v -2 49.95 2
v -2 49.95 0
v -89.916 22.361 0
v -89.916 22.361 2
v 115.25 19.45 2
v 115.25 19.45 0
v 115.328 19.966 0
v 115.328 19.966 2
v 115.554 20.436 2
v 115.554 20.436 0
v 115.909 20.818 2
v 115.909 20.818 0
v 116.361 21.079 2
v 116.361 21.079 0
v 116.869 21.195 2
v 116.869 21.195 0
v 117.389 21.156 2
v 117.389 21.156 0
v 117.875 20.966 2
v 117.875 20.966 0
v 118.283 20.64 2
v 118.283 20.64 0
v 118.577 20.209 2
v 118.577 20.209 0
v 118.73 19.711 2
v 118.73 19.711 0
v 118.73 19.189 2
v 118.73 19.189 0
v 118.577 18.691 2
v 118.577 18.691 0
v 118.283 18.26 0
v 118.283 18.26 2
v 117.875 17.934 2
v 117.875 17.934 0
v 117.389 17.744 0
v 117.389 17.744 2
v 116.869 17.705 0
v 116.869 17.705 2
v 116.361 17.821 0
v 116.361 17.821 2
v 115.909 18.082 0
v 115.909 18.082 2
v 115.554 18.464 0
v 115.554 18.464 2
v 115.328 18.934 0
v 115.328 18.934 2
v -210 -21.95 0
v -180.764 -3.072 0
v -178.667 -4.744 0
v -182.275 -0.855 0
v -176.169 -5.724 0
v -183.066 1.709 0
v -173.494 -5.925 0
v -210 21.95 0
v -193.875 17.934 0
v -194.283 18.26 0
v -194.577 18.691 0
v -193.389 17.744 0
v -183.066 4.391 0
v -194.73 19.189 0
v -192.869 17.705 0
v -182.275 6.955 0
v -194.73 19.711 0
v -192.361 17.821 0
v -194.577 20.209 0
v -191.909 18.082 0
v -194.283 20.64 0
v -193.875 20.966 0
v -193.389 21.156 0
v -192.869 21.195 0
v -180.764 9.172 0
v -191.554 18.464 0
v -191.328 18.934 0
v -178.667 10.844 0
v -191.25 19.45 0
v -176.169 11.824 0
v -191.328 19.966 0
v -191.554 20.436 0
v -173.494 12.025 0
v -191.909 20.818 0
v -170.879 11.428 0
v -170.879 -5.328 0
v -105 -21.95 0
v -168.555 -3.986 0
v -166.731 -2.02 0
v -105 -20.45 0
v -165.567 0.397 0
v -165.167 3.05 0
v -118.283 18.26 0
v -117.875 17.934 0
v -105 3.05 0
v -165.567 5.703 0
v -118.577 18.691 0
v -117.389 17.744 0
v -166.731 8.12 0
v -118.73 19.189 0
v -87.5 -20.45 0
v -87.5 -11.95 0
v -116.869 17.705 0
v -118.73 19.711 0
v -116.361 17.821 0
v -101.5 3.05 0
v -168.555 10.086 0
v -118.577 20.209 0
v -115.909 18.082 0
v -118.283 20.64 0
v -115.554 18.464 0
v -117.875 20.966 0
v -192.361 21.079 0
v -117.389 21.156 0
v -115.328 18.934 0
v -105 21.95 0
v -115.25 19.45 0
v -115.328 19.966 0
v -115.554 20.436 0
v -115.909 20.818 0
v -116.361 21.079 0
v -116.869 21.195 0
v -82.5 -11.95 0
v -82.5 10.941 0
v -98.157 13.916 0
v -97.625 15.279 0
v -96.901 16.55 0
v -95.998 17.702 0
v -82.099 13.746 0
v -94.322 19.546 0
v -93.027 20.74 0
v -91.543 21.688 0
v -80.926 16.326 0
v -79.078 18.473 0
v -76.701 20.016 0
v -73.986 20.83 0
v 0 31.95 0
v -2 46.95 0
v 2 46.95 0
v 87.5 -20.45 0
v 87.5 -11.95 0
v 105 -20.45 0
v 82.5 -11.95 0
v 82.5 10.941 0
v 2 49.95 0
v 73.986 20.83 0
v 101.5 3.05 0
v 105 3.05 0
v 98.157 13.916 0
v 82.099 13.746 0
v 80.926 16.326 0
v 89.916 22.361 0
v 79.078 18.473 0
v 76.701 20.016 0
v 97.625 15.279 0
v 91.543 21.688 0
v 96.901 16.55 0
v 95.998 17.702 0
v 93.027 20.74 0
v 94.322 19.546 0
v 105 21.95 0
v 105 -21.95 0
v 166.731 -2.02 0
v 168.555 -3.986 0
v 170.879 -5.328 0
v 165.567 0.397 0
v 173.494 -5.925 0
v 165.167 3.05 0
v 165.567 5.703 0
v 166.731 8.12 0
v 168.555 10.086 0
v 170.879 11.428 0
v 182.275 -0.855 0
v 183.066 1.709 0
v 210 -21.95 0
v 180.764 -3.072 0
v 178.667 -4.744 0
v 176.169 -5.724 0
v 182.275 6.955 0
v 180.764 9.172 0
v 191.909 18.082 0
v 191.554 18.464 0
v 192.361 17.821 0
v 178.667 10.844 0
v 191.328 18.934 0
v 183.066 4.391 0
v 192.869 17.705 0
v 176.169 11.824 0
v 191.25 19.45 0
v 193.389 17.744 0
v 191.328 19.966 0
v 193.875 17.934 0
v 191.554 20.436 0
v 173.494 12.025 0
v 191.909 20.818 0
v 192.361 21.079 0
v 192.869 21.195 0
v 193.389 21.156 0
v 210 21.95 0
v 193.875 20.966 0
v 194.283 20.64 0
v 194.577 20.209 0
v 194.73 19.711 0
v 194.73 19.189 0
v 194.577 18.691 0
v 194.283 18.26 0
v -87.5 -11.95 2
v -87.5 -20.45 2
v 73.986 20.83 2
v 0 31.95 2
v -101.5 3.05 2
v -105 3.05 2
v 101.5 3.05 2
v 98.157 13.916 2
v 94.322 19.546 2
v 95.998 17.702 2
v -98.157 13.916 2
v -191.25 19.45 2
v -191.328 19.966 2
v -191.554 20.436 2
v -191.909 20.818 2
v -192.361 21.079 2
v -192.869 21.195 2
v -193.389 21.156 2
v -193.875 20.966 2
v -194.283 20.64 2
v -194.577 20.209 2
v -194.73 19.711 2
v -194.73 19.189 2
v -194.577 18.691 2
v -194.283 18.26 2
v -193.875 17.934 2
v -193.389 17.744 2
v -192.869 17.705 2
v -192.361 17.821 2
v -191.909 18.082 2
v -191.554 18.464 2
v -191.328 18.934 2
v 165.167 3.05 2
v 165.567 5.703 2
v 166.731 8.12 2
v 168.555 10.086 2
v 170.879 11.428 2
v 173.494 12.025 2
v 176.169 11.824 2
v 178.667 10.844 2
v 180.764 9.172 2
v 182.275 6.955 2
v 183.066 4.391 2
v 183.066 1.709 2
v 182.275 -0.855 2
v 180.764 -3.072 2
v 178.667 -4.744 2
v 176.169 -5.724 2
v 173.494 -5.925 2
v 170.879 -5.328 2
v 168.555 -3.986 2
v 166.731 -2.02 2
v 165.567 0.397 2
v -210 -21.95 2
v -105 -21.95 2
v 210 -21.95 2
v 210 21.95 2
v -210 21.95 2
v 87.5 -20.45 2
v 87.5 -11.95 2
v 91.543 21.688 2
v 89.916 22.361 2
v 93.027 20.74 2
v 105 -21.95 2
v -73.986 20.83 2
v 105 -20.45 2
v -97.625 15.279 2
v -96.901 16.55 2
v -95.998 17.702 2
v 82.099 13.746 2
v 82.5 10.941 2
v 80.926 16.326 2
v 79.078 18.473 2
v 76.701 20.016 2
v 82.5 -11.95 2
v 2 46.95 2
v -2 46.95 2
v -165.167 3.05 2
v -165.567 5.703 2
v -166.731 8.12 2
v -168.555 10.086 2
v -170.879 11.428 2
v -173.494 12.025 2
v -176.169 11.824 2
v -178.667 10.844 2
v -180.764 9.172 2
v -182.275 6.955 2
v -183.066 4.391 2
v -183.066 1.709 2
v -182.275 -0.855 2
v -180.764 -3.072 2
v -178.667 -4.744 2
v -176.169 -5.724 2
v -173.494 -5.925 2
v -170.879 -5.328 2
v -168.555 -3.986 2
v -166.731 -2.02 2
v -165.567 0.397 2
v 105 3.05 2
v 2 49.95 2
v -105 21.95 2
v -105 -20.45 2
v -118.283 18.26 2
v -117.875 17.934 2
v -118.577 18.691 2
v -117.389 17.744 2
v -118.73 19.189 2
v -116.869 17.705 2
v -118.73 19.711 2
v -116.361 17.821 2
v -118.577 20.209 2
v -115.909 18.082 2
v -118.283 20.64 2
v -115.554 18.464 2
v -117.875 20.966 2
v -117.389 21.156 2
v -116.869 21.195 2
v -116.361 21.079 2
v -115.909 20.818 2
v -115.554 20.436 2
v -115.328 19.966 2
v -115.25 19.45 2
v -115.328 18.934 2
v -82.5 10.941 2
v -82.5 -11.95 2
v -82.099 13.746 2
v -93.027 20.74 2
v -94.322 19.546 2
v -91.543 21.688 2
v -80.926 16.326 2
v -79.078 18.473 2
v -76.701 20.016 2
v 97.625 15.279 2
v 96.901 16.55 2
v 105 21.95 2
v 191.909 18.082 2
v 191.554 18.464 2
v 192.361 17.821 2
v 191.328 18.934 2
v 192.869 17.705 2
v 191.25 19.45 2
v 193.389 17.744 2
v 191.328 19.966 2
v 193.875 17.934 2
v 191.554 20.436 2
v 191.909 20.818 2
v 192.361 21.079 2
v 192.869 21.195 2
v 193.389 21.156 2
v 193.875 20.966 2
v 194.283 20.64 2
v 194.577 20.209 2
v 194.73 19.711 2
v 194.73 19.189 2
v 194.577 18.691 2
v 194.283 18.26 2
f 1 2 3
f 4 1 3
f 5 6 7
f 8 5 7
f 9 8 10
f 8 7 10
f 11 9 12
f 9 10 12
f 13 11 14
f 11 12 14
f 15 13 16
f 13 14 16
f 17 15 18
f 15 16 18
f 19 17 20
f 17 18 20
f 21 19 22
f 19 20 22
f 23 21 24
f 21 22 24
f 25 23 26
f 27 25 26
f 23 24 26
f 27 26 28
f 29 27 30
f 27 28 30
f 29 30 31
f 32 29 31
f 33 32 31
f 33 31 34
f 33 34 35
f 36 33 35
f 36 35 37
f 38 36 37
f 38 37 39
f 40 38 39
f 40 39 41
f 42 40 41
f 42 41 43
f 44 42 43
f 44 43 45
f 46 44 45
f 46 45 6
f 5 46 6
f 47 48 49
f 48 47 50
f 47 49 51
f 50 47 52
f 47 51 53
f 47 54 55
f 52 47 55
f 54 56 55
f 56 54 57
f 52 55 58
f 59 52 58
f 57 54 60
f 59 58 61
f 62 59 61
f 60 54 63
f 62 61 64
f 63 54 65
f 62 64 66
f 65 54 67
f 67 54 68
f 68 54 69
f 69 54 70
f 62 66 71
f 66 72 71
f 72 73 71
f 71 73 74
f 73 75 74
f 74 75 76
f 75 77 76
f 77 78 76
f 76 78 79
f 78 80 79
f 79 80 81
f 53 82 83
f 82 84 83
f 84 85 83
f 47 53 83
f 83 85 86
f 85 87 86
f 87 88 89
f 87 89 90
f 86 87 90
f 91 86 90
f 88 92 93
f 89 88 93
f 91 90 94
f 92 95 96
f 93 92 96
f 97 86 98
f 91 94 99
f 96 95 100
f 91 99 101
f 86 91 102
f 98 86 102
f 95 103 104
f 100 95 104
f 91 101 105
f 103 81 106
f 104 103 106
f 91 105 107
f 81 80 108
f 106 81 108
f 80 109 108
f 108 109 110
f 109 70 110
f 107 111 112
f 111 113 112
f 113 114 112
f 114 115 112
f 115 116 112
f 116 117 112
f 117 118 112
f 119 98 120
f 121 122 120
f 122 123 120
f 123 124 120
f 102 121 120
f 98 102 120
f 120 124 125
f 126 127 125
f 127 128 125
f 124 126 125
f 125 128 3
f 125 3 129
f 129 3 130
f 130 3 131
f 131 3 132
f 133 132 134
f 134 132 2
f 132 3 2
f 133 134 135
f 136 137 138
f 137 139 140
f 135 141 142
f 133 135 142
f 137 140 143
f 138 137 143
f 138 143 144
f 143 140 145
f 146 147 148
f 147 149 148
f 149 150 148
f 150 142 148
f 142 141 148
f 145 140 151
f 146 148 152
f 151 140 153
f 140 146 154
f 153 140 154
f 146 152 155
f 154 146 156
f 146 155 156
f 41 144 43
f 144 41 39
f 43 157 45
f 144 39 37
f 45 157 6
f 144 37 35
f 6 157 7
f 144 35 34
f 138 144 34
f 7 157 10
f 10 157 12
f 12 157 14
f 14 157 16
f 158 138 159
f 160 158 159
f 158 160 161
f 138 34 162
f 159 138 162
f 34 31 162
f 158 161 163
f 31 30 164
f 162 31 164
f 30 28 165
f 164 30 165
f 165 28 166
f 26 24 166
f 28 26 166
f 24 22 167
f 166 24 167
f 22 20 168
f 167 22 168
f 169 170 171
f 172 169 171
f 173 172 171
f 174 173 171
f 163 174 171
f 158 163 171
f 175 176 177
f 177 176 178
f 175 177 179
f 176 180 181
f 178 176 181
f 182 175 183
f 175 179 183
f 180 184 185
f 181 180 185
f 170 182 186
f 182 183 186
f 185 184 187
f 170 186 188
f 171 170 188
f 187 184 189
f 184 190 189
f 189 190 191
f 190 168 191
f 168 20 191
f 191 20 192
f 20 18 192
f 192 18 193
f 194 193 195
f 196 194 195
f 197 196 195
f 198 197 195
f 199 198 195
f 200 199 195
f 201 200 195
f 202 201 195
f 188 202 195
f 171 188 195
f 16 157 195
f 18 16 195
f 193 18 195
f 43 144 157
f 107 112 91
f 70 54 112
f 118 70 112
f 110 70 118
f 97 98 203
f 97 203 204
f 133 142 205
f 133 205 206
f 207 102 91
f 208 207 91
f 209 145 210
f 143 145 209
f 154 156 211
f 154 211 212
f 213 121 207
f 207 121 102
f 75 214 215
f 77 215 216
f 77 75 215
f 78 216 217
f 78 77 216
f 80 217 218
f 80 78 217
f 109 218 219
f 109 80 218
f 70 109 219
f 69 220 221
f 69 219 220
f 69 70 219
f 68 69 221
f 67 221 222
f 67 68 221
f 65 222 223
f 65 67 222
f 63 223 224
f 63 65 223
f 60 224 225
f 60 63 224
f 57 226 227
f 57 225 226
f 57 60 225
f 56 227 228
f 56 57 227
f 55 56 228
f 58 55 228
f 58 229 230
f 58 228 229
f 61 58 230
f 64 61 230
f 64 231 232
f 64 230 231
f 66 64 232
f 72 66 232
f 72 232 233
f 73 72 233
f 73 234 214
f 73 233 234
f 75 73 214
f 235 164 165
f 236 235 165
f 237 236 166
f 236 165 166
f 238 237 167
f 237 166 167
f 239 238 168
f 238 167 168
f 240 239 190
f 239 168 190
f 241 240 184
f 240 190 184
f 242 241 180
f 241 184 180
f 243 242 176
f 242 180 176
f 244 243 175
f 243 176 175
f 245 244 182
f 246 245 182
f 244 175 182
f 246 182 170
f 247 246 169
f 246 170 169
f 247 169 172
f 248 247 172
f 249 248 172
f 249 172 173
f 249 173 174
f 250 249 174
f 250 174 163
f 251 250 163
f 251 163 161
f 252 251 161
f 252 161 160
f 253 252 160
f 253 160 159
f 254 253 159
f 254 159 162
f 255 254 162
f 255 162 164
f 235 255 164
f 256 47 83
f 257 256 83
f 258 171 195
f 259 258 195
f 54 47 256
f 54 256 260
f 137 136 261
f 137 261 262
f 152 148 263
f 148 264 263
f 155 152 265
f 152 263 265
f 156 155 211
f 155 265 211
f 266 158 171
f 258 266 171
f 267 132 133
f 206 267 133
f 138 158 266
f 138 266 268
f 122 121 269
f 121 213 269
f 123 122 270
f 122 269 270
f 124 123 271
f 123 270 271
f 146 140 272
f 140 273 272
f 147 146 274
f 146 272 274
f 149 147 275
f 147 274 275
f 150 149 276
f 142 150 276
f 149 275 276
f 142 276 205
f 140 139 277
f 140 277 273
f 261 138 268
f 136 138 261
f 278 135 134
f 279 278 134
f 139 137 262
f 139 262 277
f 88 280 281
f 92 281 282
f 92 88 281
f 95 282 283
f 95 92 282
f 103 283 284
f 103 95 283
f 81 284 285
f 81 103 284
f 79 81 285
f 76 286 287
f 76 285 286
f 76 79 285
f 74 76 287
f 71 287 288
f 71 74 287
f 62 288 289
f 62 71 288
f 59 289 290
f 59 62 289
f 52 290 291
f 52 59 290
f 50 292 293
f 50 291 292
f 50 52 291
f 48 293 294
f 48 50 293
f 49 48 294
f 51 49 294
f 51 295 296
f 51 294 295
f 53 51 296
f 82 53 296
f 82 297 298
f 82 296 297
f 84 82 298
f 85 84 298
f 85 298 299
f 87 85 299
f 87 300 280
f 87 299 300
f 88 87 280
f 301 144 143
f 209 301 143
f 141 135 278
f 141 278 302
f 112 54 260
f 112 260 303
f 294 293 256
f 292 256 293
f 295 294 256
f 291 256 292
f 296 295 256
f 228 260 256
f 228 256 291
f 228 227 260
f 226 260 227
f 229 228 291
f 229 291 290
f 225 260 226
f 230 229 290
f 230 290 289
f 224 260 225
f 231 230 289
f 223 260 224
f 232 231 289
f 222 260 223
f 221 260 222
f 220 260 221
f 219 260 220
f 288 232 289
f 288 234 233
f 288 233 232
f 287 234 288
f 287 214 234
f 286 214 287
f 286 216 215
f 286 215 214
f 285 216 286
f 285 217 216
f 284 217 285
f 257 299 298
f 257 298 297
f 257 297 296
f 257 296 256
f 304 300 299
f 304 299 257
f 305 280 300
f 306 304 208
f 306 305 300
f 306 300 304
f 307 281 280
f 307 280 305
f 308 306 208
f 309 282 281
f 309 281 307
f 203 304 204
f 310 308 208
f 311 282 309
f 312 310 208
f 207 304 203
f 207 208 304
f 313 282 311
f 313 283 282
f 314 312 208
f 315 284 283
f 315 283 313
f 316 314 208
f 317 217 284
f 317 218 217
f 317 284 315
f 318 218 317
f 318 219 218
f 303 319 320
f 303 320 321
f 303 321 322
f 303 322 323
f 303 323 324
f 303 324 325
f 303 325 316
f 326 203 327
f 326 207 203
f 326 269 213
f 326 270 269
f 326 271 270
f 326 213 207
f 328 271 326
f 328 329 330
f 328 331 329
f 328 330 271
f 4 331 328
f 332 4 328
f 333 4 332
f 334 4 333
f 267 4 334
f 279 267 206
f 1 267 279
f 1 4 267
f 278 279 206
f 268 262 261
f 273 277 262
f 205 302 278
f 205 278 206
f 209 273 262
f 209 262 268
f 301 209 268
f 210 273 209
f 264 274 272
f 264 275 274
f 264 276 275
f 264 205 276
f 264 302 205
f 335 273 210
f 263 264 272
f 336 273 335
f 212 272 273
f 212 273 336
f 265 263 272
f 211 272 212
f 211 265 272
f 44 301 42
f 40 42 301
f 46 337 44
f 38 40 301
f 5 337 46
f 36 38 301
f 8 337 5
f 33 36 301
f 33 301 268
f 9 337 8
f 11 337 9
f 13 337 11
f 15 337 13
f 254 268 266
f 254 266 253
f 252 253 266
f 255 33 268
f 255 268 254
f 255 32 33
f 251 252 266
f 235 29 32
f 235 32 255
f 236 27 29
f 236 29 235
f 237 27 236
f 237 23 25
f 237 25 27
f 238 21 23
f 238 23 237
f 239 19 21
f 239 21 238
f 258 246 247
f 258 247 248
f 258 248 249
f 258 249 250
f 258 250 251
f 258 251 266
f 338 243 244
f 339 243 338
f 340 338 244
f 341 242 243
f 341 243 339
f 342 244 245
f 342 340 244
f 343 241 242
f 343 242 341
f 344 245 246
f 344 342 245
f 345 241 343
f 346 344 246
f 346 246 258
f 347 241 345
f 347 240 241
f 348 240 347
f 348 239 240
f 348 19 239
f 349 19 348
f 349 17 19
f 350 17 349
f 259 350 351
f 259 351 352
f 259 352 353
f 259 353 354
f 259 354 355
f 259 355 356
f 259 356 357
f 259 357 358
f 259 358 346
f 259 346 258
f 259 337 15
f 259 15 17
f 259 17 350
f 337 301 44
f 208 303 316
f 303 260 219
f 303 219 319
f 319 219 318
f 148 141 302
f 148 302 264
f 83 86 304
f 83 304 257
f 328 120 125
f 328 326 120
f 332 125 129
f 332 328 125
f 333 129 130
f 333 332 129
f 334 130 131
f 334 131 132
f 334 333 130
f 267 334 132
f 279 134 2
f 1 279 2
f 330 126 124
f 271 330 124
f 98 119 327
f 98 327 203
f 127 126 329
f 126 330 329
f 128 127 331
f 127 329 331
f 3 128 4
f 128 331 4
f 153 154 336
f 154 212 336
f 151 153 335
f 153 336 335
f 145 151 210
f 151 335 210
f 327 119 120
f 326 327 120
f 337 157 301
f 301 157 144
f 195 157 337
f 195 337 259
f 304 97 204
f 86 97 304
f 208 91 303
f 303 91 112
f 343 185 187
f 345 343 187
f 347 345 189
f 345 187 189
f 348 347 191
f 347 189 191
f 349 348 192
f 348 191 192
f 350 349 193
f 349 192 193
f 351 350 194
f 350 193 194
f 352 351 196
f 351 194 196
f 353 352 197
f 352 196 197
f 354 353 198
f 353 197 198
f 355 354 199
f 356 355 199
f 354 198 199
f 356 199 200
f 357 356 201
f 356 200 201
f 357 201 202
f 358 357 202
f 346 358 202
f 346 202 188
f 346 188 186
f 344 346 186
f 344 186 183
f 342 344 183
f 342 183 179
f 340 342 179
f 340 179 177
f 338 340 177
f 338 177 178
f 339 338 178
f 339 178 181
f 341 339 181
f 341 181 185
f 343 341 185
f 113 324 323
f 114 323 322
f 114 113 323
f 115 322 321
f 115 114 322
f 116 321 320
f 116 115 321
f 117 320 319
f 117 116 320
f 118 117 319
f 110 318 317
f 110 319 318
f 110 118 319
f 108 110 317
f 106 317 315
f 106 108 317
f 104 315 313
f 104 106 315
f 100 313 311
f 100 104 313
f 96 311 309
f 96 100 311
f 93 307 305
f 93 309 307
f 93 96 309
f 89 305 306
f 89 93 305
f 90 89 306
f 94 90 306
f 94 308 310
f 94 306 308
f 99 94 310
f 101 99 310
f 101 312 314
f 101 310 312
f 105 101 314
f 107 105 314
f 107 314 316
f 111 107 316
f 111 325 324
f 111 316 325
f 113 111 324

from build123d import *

# Parameters (mm, degrees)
SCHIZZO1_W                   = 420
SCHIZZO1_H                   = 43.9
PIASTRABASE_DEPTH            = 2
SCHIZZO2_R                   = 9
SCHIZZO2_R_2                 = 1.75
FORODESTRO_DEPTH             = 212.153504588
INTAGLIOINFERIORE_DEPTH      = 212.153504588
INTAGLIOSUPERIORE_DEPTH      = 212.153504588
ESTRUSIONE_ESTRUSIONE1_DEPTH = 2
RACCORDO2_R                  = 10
RACCORDO3_R                  = 10
RACCORDO2_OF_SPECCHIA1_R     = 10
RACCORDO3_OF_SPECCHIA1_R     = 10


with BuildPart() as part:
    # Schizzo1 → PiastraBase (new body)
    with BuildSketch(Plane.XY):
        Rectangle(SCHIZZO1_W, SCHIZZO1_H)
    extrude(amount=PIASTRABASE_DEPTH)

    # Schizzo2 → ForoDestro (cut, through all)
    with BuildSketch(Plane(origin=(0, 0, 0), x_dir=(-1, 0, 0), z_dir=(0, 0, -1))):
        with Locations((-174.166666667, 3.05)):
            Circle(SCHIZZO2_R)
        with Locations((-193, 19.45)):
            Circle(SCHIZZO2_R_2)
        with Locations((-117, 19.45)):
            Circle(SCHIZZO2_R_2)
    forodestro = extrude(amount=-FORODESTRO_DEPTH, mode=Mode.SUBTRACT)

    # ForoSinistro: ForoDestro across plane
    add(forodestro.mirror(Plane(origin=(0, 0, 0), x_dir=(0, 0, 1), z_dir=(1, 0, 0))), mode=Mode.SUBTRACT)

    # Schizzo3 → IntaglioInferiore (cut, through all)
    with BuildSketch(Plane(origin=(0, 0, 0), x_dir=(-1, 0, 0), z_dir=(0, 0, -1))):
        Polygon((-105, -21.95), (-105, -20.45), (-87.5, -20.45), (-87.5, -11.95), (-82.5, -11.95), (-82.5, -20.45), (82.5, -20.45), (82.5, -11.95), (87.5, -11.95), (87.5, -20.45), (105, -20.45), (105, -21.95), align=None)
    extrude(amount=-INTAGLIOINFERIORE_DEPTH, mode=Mode.SUBTRACT)

    # Schizzo4 → IntaglioSuperiore (cut, through all)
    with BuildSketch(Plane(origin=(0, 0, 0), x_dir=(-1, 0, 0), z_dir=(0, 0, -1))):
        Polygon((-105, 21.95), (-104.999999109, 3.05), (-82.5, 3.05), (-82.5, -20.45), (82.5, -20.45), (82.5, 3.05), (104.999999109, 3.05), (105, 21.95), align=None)
    extrude(amount=-INTAGLIOSUPERIORE_DEPTH, mode=Mode.SUBTRACT)


with BuildPart() as intagliosuperiore_piece_1:
    # of the separate pieces the step leaves, piece 1, a body of its own (intagliosuperiore_pieces)
    add(part.part.solids().sort_by_distance((-210, 21.95, 0))[0])


with BuildPart() as intagliosuperiore_piece_2:
    # of the separate pieces the step leaves, piece 2, a body of its own (intagliosuperiore_pieces)
    add(part.part.solids().sort_by_distance((210, -21.95, 0))[0])

    # Schizzo5 → Estrusione-Estrusione1 (add)
    with BuildSketch(Plane(origin=(0, 0, 0), x_dir=(-1, 0, 0), z_dir=(0, 0, -1))):
        Polygon((-82.5, 3.05), (-82.5, 19.55), (0, 31.95), (0, 46.95), (-2, 46.95), (-2, 49.95), (-92.5, 21.55), (-97.5, 16.05), (-101.5, 3.05), align=None)
    estrusione_estrusione1 = extrude(amount=-ESTRUSIONE_ESTRUSIONE1_DEPTH)

    # Raccordo2
    raccordo2_edges = [intagliosuperiore_piece_2.edges().sort_by_distance(p)[0] for p in [
        (82.5, 19.55, 1),
    ]]
    fillet(raccordo2_edges, radius=RACCORDO2_R)

    # Raccordo3
    raccordo3_edges = [intagliosuperiore_piece_2.edges().sort_by_distance(p)[0] for p in [
        (92.5, 21.55, 1),
        (97.5, 16.05, 1),
    ]]
    fillet(raccordo3_edges, radius=RACCORDO3_R)

    # Specchia1: Estrusione-Estrusione1 across plane
    add(estrusione_estrusione1.mirror(Plane(origin=(0, 0, 0), x_dir=(0, 0, 1), z_dir=(1, 0, 0))))

    # Raccordo2 of Specchia1
    raccordo2_of_specchia1_edges = [intagliosuperiore_piece_2.edges().sort_by_distance(p)[0] for p in [
        (-82.5, 19.55, 1),
    ]]
    fillet(raccordo2_of_specchia1_edges, radius=RACCORDO2_OF_SPECCHIA1_R)

    # Raccordo3 of Specchia1
    raccordo3_of_specchia1_edges = [intagliosuperiore_piece_2.edges().sort_by_distance(p)[0] for p in [
        (-92.5, 21.55, 1),
        (-97.5, 16.05, 1),
    ]]
    fillet(raccordo3_of_specchia1_edges, radius=RACCORDO3_OF_SPECCHIA1_R)

    # Abbina1: union IntaglioSuperiore piece 1
    add(intagliosuperiore_piece_1.part)


solid = intagliosuperiore_piece_2.part
